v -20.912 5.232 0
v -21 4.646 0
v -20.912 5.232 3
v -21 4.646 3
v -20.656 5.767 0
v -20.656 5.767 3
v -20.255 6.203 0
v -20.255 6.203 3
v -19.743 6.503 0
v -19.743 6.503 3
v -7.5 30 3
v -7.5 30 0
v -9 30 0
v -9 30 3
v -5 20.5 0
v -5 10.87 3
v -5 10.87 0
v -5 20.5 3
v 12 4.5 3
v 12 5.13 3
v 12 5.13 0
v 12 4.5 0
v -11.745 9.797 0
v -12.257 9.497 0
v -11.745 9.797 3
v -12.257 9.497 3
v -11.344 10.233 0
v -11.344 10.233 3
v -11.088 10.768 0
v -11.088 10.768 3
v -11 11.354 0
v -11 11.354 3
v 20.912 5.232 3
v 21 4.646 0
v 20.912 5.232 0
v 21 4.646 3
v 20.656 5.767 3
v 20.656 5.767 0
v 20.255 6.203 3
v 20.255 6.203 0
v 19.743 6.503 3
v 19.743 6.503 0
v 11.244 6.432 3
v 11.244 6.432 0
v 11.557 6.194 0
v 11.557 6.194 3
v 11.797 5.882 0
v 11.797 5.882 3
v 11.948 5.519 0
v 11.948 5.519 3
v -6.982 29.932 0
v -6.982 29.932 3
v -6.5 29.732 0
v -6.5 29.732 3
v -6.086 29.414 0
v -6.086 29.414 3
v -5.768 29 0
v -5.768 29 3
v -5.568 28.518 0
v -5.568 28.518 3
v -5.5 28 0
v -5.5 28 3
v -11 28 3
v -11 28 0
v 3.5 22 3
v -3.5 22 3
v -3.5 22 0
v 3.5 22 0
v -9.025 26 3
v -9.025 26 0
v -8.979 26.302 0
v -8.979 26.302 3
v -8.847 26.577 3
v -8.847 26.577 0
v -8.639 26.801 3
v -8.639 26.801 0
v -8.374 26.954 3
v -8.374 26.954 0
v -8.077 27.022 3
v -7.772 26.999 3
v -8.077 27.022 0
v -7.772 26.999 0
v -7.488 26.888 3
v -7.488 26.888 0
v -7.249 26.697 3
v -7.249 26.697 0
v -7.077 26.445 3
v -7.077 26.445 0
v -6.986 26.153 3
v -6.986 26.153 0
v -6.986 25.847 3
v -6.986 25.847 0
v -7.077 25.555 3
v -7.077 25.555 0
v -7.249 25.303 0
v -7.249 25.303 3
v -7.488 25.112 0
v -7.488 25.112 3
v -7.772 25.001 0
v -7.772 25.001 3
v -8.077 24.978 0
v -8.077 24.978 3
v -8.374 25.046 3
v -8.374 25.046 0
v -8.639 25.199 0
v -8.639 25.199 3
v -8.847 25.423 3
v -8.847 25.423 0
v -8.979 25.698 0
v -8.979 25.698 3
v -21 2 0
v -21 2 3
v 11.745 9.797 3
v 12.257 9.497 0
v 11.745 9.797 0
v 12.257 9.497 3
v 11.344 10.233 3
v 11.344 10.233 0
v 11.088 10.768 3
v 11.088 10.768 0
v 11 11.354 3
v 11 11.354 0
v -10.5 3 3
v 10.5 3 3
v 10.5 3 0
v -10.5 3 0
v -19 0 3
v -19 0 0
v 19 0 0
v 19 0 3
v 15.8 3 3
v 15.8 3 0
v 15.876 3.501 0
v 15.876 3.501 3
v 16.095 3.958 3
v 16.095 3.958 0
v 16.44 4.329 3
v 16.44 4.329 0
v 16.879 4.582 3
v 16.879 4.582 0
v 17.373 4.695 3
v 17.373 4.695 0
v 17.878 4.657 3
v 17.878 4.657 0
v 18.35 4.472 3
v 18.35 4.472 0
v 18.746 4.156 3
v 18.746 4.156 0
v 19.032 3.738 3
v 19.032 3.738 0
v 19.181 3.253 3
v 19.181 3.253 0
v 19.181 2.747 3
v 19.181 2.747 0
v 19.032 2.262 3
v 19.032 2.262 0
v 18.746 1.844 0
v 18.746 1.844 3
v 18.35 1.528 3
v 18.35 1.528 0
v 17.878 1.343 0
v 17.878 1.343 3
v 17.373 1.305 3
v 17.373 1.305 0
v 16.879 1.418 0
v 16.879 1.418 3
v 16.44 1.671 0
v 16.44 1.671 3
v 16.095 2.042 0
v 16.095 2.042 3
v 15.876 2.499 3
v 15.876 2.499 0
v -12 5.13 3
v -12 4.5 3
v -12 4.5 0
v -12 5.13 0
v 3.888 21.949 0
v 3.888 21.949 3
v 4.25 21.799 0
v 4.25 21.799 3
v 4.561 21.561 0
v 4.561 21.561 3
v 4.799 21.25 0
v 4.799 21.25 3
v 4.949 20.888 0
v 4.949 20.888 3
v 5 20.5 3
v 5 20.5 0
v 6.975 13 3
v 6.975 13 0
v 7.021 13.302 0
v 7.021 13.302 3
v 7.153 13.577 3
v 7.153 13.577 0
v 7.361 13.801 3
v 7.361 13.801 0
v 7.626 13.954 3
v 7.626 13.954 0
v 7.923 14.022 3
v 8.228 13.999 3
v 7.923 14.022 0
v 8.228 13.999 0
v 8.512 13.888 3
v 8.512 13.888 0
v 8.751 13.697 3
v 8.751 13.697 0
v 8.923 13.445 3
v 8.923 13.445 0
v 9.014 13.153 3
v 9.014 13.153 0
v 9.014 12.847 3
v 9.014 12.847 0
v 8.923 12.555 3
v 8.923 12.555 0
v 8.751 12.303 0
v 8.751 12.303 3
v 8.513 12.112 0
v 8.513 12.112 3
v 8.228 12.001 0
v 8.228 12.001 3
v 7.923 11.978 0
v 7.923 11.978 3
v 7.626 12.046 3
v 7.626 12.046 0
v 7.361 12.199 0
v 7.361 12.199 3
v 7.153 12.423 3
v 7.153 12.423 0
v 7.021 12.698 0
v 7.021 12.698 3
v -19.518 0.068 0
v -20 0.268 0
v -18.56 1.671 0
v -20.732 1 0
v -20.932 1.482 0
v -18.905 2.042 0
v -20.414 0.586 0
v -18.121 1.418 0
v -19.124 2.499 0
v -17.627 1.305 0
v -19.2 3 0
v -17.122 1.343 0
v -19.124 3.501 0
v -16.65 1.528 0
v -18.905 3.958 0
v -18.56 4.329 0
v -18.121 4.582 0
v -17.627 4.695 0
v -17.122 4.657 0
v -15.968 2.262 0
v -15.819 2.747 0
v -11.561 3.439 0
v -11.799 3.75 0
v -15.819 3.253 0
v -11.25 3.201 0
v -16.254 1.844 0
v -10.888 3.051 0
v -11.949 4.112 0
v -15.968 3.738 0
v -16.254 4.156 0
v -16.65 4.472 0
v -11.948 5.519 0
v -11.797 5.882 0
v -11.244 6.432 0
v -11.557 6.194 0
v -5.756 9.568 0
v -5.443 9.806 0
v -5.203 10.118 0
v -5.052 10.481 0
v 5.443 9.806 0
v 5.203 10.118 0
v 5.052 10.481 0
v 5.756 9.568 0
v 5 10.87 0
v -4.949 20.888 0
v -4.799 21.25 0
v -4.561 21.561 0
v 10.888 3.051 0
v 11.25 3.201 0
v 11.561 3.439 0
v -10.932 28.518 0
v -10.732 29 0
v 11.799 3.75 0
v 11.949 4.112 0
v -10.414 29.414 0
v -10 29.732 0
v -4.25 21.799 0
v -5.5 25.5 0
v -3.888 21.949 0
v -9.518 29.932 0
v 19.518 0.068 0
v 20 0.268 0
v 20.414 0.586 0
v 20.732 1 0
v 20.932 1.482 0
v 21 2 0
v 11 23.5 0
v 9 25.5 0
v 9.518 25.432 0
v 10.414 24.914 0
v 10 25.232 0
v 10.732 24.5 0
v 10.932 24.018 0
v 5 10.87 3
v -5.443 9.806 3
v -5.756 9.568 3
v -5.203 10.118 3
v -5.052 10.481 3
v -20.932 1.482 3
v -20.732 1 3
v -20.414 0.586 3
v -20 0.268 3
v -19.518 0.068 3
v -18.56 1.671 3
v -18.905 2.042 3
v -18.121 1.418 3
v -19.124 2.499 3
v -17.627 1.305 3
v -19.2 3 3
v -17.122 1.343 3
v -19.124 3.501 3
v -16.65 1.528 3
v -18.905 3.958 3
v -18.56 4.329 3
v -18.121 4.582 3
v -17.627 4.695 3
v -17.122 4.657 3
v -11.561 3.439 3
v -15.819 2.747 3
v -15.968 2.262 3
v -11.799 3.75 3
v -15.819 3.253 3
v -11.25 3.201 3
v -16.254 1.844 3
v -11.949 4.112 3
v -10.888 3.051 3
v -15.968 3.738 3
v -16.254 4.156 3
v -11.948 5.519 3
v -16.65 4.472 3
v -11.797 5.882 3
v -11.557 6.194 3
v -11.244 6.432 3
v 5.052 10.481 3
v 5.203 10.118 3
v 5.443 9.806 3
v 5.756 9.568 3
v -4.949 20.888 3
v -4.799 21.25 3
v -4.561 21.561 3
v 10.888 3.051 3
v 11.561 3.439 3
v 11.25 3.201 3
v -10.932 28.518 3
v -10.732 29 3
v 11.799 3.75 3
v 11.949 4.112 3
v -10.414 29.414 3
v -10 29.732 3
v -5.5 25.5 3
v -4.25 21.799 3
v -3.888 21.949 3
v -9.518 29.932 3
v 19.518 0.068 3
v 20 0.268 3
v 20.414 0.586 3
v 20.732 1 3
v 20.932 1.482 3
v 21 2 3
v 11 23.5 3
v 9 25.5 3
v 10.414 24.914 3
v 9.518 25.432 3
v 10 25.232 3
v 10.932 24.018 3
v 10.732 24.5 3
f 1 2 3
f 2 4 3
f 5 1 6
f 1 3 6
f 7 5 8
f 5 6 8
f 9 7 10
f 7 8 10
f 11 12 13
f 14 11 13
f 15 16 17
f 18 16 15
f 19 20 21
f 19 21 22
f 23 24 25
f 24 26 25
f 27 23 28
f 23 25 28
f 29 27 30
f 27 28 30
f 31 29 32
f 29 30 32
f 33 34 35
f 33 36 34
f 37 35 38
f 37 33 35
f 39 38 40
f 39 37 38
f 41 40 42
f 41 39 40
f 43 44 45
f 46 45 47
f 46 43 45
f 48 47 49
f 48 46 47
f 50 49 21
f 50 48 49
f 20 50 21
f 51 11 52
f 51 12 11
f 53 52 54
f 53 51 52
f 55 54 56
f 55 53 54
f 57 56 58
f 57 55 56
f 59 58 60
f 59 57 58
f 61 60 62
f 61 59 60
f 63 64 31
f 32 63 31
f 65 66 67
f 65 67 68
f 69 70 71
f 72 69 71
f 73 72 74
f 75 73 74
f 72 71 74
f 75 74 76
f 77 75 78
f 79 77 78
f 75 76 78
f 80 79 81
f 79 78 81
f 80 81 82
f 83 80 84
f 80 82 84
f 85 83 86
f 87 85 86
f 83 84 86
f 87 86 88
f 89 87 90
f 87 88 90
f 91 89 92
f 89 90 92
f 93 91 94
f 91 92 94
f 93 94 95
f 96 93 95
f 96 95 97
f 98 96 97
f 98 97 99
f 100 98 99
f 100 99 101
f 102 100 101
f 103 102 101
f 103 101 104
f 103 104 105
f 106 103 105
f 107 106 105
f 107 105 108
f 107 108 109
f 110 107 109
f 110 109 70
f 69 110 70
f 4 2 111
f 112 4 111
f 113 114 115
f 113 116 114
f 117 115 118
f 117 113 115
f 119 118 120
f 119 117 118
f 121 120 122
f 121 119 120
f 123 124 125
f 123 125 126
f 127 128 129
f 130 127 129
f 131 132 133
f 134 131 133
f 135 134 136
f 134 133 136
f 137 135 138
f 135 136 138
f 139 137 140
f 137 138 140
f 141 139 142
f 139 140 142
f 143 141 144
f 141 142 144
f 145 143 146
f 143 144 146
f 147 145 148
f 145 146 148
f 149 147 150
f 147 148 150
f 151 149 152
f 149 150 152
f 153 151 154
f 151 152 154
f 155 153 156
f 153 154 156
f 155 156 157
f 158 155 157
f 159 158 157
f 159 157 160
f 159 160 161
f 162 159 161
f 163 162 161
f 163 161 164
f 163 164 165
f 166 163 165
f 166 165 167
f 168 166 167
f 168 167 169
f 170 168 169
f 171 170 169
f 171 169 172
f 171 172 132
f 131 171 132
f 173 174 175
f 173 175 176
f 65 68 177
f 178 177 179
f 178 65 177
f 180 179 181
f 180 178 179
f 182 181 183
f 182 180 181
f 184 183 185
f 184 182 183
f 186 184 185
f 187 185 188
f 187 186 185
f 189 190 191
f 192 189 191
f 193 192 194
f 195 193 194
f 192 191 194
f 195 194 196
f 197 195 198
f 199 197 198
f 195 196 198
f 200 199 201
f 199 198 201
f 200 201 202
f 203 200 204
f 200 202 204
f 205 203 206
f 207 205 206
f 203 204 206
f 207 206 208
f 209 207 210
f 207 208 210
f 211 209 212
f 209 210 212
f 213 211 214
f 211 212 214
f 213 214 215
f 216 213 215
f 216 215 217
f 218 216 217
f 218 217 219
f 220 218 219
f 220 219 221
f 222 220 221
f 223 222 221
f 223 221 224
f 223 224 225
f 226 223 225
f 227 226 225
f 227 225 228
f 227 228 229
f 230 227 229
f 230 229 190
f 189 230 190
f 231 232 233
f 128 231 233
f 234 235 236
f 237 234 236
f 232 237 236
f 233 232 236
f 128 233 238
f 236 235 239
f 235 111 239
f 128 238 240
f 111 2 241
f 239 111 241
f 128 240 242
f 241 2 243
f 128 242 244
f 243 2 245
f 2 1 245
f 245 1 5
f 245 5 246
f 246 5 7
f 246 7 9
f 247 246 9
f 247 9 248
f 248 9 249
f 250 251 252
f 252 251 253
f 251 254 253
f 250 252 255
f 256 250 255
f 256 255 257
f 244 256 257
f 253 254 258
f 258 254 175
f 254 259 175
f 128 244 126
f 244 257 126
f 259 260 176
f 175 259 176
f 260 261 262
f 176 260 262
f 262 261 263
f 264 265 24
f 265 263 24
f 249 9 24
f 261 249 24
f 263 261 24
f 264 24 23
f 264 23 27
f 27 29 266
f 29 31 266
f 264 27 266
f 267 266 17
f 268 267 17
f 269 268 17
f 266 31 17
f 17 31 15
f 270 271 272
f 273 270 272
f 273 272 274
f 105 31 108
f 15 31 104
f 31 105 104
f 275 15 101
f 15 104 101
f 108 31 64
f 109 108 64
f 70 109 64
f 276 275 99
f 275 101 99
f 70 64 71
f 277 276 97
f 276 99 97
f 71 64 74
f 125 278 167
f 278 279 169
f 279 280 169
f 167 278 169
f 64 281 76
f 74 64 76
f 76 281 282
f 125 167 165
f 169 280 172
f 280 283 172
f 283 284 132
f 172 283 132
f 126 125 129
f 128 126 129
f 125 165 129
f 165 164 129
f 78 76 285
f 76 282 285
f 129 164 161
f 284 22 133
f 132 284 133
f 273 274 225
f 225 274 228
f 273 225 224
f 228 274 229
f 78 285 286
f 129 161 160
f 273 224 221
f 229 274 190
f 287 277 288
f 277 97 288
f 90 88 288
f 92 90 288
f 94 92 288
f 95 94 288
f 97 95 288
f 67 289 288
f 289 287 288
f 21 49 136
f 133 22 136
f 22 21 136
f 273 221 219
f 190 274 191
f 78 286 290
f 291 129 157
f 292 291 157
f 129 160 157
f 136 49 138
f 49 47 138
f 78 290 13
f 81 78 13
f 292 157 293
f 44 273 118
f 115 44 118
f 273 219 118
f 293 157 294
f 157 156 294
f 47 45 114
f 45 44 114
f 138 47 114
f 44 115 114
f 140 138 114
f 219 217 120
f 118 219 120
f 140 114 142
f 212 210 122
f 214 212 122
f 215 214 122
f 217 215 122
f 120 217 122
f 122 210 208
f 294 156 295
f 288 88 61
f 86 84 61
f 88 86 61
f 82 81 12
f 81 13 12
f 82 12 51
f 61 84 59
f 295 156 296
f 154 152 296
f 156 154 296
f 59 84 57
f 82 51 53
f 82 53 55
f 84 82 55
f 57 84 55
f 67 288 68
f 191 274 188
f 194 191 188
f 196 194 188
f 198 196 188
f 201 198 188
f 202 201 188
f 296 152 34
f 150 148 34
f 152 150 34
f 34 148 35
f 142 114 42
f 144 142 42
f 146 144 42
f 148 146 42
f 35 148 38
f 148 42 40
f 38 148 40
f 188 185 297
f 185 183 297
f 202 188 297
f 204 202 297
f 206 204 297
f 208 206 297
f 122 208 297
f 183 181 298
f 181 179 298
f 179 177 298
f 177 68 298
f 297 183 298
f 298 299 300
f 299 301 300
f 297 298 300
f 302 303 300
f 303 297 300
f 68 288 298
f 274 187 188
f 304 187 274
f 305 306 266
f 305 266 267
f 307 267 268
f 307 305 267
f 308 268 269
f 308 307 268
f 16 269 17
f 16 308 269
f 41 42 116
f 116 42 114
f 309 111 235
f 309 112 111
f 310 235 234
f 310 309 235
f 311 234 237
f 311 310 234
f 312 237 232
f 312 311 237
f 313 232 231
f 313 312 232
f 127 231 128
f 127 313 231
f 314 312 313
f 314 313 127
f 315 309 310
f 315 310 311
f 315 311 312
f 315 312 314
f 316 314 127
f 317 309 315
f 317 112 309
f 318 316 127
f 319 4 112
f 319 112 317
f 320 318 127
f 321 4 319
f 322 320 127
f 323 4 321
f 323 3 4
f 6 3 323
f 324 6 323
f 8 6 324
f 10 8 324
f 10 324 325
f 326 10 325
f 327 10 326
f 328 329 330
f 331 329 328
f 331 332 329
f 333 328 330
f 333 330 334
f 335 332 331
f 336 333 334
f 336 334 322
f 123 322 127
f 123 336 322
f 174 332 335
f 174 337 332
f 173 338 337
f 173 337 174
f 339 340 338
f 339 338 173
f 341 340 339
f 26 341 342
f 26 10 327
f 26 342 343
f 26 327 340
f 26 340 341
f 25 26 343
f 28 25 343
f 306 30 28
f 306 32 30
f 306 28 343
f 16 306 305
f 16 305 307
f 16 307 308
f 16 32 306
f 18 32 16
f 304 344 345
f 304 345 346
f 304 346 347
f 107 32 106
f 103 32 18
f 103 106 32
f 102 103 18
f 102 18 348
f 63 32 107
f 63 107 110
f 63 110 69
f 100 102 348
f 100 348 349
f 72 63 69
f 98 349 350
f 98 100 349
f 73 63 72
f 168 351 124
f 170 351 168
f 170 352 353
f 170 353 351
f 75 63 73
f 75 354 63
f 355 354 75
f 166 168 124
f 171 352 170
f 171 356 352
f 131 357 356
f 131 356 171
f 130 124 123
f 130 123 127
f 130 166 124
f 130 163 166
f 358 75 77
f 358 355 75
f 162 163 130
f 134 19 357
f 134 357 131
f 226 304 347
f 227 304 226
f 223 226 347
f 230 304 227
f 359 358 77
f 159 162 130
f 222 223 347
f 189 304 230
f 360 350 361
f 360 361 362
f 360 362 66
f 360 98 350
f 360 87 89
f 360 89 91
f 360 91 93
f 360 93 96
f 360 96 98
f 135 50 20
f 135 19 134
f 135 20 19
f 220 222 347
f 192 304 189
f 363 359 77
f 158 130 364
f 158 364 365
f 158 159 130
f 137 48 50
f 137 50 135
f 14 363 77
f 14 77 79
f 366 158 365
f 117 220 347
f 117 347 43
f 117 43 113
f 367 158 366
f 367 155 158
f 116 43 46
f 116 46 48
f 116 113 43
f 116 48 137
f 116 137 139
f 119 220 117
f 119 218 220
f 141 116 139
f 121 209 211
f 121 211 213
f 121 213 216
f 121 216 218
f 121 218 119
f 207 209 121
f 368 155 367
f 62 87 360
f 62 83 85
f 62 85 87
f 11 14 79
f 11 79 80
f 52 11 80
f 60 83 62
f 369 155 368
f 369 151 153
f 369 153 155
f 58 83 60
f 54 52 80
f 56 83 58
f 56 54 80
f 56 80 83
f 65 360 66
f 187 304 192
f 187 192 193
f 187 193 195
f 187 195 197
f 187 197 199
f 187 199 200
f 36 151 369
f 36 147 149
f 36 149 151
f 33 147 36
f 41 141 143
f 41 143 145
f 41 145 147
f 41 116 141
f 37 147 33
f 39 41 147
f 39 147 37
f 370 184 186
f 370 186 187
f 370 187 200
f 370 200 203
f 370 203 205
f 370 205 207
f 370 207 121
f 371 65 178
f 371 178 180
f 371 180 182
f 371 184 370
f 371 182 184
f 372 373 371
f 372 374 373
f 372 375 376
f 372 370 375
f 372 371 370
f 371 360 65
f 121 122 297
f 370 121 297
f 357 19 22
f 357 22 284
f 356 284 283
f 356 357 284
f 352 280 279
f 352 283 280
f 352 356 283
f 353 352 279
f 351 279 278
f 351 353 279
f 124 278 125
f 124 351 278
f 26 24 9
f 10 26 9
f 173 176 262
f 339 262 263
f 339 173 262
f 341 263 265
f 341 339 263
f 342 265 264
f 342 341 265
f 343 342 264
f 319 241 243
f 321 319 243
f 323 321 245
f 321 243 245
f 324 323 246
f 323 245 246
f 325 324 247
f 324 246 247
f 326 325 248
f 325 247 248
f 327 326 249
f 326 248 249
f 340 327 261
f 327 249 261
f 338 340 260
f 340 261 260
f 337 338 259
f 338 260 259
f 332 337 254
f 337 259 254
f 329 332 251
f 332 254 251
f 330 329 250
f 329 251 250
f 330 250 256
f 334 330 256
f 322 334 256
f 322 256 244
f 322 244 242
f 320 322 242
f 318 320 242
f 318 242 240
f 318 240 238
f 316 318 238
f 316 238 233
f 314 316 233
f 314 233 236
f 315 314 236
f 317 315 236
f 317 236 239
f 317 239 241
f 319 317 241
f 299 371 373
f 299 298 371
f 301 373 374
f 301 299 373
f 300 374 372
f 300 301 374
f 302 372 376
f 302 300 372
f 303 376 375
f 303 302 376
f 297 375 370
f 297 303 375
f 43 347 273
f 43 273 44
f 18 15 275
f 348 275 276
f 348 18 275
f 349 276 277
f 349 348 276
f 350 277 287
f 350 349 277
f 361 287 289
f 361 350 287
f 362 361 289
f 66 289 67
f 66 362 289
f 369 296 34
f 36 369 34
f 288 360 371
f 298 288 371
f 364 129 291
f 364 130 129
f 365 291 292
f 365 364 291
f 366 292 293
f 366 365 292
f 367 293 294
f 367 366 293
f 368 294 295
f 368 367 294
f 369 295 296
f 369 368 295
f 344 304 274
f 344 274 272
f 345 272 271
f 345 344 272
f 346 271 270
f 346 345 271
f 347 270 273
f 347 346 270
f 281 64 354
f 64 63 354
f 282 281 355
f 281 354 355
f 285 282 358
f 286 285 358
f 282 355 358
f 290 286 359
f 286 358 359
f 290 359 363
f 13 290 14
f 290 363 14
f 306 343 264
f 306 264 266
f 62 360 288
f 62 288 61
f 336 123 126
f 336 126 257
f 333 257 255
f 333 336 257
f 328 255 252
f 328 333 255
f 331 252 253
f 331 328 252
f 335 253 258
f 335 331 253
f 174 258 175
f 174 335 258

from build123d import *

# Parameters (mm, degrees)
SKETCH1_R                = 0.5
BOSS_EXTRUDE1_DEPTH      = 3
M2_5X0_45_TAPPED_HOLE1_D = 2.05
SKETCH4_W                = 16.5
SKETCH4_H                = 4.5
CUT_EXTRUDE1_DEPTH       = 4
FILLET1_R                = 2
M3_CLEARANCE_HOLE1_D     = 3.4
M3_CLEARANCE_HOLE1_DEPTH = 3
FILLET2_R                = 2


with BuildPart() as part:
    # Sketch1 → Boss-Extrude1 (new body)
    with BuildSketch(Plane.XY):
        Polygon((-21, 0), (21, 0), (21, 6), (11, 10), (11, 30), (-11, 30), (-11, 10), (-21, 6), align=None)
        with Locations((-8, 26)):
            Circle(SKETCH1_R, mode=Mode.SUBTRACT)
        with Locations((8, 13)):
            Circle(SKETCH1_R, mode=Mode.SUBTRACT)
        with Locations((-17.5, 3)):
            Circle(SKETCH1_R, mode=Mode.SUBTRACT)
        with Locations((17.5, 3)):
            Circle(SKETCH1_R, mode=Mode.SUBTRACT)
    extrude(amount=BOSS_EXTRUDE1_DEPTH)

    # M2.5x0.45 Tapped Hole1 (through all)
    with Locations(Plane.XY.offset(3)):
        with Locations((-8, 26), (8, 13)):
            Hole(M2_5X0_45_TAPPED_HOLE1_D / 2)

    # Sketch4 → Cut-Extrude1 (cut, through all)
    with BuildSketch(Plane.XY.offset(3)):
        with Locations((2.75, 27.75)):
            Rectangle(SKETCH4_W, SKETCH4_H)
        with BuildLine():
            Line((-3.5, 22), (3.5, 22))
            ThreePointArc((3.5, 22), (4.560660172, 21.560660172), (5, 20.5))
            Line((5, 20.5), (5, 10.870483803))
            ThreePointArc((5, 10.870483803), (5.20263486, 10.117593576), (5.755791592, 9.56811909))
            Line((5.755791592, 9.56811909), (11.244208408, 6.43188091))
            ThreePointArc((11.244208408, 6.43188091), (11.79736514, 5.882406424), (12, 5.129516197))
            Line((12, 5.129516197), (12, 4.5))
            ThreePointArc((12, 4.5), (11.560660172, 3.439339828), (10.5, 3))
            Line((10.5, 3), (-10.5, 3))
            ThreePointArc((-10.5, 3), (-11.560660172, 3.439339828), (-12, 4.5))
            Line((-12, 4.5), (-12, 5.129516197))
            ThreePointArc((-12, 5.129516197), (-11.79736514, 5.882406424), (-11.244208408, 6.43188091))
            Line((-11.244208408, 6.43188091), (-5.755791592, 9.56811909))
            ThreePointArc((-5.755791592, 9.56811909), (-5.20263486, 10.117593576), (-5, 10.870483803))
            Line((-5, 10.870483803), (-5, 20.5))
            ThreePointArc((-5, 20.5), (-4.560660172, 21.560660172), (-3.5, 22))
        make_face()
    extrude(amount=-CUT_EXTRUDE1_DEPTH, mode=Mode.SUBTRACT)

    # Fillet1
    fillet1_edges = [part.edges().sort_by_distance(p)[0] for p in [
        (-21, 6, 1.5),
        (-11, 10, 1.5),
        (-11, 30, 1.5),
        (11, 10, 1.5),
        (21, 6, 1.5),
        (-5.5, 30, 1.5),
        (11, 25.5, 1.5),
    ]]
    fillet(fillet1_edges, radius=FILLET1_R)

    # M3 Clearance Hole1
    with Locations(Plane.XY.offset(3)):
        with Locations((-17.5, 3), (17.5, 3)):
            Hole(M3_CLEARANCE_HOLE1_D / 2, depth=M3_CLEARANCE_HOLE1_DEPTH)

    # Fillet2
    fillet2_edges = [part.edges().sort_by_distance(p)[0] for p in [
        (21, 0, 1.5),
        (-21, 0, 1.5),
    ]]
    fillet(fillet2_edges, radius=FILLET2_R)


solid = part.part
